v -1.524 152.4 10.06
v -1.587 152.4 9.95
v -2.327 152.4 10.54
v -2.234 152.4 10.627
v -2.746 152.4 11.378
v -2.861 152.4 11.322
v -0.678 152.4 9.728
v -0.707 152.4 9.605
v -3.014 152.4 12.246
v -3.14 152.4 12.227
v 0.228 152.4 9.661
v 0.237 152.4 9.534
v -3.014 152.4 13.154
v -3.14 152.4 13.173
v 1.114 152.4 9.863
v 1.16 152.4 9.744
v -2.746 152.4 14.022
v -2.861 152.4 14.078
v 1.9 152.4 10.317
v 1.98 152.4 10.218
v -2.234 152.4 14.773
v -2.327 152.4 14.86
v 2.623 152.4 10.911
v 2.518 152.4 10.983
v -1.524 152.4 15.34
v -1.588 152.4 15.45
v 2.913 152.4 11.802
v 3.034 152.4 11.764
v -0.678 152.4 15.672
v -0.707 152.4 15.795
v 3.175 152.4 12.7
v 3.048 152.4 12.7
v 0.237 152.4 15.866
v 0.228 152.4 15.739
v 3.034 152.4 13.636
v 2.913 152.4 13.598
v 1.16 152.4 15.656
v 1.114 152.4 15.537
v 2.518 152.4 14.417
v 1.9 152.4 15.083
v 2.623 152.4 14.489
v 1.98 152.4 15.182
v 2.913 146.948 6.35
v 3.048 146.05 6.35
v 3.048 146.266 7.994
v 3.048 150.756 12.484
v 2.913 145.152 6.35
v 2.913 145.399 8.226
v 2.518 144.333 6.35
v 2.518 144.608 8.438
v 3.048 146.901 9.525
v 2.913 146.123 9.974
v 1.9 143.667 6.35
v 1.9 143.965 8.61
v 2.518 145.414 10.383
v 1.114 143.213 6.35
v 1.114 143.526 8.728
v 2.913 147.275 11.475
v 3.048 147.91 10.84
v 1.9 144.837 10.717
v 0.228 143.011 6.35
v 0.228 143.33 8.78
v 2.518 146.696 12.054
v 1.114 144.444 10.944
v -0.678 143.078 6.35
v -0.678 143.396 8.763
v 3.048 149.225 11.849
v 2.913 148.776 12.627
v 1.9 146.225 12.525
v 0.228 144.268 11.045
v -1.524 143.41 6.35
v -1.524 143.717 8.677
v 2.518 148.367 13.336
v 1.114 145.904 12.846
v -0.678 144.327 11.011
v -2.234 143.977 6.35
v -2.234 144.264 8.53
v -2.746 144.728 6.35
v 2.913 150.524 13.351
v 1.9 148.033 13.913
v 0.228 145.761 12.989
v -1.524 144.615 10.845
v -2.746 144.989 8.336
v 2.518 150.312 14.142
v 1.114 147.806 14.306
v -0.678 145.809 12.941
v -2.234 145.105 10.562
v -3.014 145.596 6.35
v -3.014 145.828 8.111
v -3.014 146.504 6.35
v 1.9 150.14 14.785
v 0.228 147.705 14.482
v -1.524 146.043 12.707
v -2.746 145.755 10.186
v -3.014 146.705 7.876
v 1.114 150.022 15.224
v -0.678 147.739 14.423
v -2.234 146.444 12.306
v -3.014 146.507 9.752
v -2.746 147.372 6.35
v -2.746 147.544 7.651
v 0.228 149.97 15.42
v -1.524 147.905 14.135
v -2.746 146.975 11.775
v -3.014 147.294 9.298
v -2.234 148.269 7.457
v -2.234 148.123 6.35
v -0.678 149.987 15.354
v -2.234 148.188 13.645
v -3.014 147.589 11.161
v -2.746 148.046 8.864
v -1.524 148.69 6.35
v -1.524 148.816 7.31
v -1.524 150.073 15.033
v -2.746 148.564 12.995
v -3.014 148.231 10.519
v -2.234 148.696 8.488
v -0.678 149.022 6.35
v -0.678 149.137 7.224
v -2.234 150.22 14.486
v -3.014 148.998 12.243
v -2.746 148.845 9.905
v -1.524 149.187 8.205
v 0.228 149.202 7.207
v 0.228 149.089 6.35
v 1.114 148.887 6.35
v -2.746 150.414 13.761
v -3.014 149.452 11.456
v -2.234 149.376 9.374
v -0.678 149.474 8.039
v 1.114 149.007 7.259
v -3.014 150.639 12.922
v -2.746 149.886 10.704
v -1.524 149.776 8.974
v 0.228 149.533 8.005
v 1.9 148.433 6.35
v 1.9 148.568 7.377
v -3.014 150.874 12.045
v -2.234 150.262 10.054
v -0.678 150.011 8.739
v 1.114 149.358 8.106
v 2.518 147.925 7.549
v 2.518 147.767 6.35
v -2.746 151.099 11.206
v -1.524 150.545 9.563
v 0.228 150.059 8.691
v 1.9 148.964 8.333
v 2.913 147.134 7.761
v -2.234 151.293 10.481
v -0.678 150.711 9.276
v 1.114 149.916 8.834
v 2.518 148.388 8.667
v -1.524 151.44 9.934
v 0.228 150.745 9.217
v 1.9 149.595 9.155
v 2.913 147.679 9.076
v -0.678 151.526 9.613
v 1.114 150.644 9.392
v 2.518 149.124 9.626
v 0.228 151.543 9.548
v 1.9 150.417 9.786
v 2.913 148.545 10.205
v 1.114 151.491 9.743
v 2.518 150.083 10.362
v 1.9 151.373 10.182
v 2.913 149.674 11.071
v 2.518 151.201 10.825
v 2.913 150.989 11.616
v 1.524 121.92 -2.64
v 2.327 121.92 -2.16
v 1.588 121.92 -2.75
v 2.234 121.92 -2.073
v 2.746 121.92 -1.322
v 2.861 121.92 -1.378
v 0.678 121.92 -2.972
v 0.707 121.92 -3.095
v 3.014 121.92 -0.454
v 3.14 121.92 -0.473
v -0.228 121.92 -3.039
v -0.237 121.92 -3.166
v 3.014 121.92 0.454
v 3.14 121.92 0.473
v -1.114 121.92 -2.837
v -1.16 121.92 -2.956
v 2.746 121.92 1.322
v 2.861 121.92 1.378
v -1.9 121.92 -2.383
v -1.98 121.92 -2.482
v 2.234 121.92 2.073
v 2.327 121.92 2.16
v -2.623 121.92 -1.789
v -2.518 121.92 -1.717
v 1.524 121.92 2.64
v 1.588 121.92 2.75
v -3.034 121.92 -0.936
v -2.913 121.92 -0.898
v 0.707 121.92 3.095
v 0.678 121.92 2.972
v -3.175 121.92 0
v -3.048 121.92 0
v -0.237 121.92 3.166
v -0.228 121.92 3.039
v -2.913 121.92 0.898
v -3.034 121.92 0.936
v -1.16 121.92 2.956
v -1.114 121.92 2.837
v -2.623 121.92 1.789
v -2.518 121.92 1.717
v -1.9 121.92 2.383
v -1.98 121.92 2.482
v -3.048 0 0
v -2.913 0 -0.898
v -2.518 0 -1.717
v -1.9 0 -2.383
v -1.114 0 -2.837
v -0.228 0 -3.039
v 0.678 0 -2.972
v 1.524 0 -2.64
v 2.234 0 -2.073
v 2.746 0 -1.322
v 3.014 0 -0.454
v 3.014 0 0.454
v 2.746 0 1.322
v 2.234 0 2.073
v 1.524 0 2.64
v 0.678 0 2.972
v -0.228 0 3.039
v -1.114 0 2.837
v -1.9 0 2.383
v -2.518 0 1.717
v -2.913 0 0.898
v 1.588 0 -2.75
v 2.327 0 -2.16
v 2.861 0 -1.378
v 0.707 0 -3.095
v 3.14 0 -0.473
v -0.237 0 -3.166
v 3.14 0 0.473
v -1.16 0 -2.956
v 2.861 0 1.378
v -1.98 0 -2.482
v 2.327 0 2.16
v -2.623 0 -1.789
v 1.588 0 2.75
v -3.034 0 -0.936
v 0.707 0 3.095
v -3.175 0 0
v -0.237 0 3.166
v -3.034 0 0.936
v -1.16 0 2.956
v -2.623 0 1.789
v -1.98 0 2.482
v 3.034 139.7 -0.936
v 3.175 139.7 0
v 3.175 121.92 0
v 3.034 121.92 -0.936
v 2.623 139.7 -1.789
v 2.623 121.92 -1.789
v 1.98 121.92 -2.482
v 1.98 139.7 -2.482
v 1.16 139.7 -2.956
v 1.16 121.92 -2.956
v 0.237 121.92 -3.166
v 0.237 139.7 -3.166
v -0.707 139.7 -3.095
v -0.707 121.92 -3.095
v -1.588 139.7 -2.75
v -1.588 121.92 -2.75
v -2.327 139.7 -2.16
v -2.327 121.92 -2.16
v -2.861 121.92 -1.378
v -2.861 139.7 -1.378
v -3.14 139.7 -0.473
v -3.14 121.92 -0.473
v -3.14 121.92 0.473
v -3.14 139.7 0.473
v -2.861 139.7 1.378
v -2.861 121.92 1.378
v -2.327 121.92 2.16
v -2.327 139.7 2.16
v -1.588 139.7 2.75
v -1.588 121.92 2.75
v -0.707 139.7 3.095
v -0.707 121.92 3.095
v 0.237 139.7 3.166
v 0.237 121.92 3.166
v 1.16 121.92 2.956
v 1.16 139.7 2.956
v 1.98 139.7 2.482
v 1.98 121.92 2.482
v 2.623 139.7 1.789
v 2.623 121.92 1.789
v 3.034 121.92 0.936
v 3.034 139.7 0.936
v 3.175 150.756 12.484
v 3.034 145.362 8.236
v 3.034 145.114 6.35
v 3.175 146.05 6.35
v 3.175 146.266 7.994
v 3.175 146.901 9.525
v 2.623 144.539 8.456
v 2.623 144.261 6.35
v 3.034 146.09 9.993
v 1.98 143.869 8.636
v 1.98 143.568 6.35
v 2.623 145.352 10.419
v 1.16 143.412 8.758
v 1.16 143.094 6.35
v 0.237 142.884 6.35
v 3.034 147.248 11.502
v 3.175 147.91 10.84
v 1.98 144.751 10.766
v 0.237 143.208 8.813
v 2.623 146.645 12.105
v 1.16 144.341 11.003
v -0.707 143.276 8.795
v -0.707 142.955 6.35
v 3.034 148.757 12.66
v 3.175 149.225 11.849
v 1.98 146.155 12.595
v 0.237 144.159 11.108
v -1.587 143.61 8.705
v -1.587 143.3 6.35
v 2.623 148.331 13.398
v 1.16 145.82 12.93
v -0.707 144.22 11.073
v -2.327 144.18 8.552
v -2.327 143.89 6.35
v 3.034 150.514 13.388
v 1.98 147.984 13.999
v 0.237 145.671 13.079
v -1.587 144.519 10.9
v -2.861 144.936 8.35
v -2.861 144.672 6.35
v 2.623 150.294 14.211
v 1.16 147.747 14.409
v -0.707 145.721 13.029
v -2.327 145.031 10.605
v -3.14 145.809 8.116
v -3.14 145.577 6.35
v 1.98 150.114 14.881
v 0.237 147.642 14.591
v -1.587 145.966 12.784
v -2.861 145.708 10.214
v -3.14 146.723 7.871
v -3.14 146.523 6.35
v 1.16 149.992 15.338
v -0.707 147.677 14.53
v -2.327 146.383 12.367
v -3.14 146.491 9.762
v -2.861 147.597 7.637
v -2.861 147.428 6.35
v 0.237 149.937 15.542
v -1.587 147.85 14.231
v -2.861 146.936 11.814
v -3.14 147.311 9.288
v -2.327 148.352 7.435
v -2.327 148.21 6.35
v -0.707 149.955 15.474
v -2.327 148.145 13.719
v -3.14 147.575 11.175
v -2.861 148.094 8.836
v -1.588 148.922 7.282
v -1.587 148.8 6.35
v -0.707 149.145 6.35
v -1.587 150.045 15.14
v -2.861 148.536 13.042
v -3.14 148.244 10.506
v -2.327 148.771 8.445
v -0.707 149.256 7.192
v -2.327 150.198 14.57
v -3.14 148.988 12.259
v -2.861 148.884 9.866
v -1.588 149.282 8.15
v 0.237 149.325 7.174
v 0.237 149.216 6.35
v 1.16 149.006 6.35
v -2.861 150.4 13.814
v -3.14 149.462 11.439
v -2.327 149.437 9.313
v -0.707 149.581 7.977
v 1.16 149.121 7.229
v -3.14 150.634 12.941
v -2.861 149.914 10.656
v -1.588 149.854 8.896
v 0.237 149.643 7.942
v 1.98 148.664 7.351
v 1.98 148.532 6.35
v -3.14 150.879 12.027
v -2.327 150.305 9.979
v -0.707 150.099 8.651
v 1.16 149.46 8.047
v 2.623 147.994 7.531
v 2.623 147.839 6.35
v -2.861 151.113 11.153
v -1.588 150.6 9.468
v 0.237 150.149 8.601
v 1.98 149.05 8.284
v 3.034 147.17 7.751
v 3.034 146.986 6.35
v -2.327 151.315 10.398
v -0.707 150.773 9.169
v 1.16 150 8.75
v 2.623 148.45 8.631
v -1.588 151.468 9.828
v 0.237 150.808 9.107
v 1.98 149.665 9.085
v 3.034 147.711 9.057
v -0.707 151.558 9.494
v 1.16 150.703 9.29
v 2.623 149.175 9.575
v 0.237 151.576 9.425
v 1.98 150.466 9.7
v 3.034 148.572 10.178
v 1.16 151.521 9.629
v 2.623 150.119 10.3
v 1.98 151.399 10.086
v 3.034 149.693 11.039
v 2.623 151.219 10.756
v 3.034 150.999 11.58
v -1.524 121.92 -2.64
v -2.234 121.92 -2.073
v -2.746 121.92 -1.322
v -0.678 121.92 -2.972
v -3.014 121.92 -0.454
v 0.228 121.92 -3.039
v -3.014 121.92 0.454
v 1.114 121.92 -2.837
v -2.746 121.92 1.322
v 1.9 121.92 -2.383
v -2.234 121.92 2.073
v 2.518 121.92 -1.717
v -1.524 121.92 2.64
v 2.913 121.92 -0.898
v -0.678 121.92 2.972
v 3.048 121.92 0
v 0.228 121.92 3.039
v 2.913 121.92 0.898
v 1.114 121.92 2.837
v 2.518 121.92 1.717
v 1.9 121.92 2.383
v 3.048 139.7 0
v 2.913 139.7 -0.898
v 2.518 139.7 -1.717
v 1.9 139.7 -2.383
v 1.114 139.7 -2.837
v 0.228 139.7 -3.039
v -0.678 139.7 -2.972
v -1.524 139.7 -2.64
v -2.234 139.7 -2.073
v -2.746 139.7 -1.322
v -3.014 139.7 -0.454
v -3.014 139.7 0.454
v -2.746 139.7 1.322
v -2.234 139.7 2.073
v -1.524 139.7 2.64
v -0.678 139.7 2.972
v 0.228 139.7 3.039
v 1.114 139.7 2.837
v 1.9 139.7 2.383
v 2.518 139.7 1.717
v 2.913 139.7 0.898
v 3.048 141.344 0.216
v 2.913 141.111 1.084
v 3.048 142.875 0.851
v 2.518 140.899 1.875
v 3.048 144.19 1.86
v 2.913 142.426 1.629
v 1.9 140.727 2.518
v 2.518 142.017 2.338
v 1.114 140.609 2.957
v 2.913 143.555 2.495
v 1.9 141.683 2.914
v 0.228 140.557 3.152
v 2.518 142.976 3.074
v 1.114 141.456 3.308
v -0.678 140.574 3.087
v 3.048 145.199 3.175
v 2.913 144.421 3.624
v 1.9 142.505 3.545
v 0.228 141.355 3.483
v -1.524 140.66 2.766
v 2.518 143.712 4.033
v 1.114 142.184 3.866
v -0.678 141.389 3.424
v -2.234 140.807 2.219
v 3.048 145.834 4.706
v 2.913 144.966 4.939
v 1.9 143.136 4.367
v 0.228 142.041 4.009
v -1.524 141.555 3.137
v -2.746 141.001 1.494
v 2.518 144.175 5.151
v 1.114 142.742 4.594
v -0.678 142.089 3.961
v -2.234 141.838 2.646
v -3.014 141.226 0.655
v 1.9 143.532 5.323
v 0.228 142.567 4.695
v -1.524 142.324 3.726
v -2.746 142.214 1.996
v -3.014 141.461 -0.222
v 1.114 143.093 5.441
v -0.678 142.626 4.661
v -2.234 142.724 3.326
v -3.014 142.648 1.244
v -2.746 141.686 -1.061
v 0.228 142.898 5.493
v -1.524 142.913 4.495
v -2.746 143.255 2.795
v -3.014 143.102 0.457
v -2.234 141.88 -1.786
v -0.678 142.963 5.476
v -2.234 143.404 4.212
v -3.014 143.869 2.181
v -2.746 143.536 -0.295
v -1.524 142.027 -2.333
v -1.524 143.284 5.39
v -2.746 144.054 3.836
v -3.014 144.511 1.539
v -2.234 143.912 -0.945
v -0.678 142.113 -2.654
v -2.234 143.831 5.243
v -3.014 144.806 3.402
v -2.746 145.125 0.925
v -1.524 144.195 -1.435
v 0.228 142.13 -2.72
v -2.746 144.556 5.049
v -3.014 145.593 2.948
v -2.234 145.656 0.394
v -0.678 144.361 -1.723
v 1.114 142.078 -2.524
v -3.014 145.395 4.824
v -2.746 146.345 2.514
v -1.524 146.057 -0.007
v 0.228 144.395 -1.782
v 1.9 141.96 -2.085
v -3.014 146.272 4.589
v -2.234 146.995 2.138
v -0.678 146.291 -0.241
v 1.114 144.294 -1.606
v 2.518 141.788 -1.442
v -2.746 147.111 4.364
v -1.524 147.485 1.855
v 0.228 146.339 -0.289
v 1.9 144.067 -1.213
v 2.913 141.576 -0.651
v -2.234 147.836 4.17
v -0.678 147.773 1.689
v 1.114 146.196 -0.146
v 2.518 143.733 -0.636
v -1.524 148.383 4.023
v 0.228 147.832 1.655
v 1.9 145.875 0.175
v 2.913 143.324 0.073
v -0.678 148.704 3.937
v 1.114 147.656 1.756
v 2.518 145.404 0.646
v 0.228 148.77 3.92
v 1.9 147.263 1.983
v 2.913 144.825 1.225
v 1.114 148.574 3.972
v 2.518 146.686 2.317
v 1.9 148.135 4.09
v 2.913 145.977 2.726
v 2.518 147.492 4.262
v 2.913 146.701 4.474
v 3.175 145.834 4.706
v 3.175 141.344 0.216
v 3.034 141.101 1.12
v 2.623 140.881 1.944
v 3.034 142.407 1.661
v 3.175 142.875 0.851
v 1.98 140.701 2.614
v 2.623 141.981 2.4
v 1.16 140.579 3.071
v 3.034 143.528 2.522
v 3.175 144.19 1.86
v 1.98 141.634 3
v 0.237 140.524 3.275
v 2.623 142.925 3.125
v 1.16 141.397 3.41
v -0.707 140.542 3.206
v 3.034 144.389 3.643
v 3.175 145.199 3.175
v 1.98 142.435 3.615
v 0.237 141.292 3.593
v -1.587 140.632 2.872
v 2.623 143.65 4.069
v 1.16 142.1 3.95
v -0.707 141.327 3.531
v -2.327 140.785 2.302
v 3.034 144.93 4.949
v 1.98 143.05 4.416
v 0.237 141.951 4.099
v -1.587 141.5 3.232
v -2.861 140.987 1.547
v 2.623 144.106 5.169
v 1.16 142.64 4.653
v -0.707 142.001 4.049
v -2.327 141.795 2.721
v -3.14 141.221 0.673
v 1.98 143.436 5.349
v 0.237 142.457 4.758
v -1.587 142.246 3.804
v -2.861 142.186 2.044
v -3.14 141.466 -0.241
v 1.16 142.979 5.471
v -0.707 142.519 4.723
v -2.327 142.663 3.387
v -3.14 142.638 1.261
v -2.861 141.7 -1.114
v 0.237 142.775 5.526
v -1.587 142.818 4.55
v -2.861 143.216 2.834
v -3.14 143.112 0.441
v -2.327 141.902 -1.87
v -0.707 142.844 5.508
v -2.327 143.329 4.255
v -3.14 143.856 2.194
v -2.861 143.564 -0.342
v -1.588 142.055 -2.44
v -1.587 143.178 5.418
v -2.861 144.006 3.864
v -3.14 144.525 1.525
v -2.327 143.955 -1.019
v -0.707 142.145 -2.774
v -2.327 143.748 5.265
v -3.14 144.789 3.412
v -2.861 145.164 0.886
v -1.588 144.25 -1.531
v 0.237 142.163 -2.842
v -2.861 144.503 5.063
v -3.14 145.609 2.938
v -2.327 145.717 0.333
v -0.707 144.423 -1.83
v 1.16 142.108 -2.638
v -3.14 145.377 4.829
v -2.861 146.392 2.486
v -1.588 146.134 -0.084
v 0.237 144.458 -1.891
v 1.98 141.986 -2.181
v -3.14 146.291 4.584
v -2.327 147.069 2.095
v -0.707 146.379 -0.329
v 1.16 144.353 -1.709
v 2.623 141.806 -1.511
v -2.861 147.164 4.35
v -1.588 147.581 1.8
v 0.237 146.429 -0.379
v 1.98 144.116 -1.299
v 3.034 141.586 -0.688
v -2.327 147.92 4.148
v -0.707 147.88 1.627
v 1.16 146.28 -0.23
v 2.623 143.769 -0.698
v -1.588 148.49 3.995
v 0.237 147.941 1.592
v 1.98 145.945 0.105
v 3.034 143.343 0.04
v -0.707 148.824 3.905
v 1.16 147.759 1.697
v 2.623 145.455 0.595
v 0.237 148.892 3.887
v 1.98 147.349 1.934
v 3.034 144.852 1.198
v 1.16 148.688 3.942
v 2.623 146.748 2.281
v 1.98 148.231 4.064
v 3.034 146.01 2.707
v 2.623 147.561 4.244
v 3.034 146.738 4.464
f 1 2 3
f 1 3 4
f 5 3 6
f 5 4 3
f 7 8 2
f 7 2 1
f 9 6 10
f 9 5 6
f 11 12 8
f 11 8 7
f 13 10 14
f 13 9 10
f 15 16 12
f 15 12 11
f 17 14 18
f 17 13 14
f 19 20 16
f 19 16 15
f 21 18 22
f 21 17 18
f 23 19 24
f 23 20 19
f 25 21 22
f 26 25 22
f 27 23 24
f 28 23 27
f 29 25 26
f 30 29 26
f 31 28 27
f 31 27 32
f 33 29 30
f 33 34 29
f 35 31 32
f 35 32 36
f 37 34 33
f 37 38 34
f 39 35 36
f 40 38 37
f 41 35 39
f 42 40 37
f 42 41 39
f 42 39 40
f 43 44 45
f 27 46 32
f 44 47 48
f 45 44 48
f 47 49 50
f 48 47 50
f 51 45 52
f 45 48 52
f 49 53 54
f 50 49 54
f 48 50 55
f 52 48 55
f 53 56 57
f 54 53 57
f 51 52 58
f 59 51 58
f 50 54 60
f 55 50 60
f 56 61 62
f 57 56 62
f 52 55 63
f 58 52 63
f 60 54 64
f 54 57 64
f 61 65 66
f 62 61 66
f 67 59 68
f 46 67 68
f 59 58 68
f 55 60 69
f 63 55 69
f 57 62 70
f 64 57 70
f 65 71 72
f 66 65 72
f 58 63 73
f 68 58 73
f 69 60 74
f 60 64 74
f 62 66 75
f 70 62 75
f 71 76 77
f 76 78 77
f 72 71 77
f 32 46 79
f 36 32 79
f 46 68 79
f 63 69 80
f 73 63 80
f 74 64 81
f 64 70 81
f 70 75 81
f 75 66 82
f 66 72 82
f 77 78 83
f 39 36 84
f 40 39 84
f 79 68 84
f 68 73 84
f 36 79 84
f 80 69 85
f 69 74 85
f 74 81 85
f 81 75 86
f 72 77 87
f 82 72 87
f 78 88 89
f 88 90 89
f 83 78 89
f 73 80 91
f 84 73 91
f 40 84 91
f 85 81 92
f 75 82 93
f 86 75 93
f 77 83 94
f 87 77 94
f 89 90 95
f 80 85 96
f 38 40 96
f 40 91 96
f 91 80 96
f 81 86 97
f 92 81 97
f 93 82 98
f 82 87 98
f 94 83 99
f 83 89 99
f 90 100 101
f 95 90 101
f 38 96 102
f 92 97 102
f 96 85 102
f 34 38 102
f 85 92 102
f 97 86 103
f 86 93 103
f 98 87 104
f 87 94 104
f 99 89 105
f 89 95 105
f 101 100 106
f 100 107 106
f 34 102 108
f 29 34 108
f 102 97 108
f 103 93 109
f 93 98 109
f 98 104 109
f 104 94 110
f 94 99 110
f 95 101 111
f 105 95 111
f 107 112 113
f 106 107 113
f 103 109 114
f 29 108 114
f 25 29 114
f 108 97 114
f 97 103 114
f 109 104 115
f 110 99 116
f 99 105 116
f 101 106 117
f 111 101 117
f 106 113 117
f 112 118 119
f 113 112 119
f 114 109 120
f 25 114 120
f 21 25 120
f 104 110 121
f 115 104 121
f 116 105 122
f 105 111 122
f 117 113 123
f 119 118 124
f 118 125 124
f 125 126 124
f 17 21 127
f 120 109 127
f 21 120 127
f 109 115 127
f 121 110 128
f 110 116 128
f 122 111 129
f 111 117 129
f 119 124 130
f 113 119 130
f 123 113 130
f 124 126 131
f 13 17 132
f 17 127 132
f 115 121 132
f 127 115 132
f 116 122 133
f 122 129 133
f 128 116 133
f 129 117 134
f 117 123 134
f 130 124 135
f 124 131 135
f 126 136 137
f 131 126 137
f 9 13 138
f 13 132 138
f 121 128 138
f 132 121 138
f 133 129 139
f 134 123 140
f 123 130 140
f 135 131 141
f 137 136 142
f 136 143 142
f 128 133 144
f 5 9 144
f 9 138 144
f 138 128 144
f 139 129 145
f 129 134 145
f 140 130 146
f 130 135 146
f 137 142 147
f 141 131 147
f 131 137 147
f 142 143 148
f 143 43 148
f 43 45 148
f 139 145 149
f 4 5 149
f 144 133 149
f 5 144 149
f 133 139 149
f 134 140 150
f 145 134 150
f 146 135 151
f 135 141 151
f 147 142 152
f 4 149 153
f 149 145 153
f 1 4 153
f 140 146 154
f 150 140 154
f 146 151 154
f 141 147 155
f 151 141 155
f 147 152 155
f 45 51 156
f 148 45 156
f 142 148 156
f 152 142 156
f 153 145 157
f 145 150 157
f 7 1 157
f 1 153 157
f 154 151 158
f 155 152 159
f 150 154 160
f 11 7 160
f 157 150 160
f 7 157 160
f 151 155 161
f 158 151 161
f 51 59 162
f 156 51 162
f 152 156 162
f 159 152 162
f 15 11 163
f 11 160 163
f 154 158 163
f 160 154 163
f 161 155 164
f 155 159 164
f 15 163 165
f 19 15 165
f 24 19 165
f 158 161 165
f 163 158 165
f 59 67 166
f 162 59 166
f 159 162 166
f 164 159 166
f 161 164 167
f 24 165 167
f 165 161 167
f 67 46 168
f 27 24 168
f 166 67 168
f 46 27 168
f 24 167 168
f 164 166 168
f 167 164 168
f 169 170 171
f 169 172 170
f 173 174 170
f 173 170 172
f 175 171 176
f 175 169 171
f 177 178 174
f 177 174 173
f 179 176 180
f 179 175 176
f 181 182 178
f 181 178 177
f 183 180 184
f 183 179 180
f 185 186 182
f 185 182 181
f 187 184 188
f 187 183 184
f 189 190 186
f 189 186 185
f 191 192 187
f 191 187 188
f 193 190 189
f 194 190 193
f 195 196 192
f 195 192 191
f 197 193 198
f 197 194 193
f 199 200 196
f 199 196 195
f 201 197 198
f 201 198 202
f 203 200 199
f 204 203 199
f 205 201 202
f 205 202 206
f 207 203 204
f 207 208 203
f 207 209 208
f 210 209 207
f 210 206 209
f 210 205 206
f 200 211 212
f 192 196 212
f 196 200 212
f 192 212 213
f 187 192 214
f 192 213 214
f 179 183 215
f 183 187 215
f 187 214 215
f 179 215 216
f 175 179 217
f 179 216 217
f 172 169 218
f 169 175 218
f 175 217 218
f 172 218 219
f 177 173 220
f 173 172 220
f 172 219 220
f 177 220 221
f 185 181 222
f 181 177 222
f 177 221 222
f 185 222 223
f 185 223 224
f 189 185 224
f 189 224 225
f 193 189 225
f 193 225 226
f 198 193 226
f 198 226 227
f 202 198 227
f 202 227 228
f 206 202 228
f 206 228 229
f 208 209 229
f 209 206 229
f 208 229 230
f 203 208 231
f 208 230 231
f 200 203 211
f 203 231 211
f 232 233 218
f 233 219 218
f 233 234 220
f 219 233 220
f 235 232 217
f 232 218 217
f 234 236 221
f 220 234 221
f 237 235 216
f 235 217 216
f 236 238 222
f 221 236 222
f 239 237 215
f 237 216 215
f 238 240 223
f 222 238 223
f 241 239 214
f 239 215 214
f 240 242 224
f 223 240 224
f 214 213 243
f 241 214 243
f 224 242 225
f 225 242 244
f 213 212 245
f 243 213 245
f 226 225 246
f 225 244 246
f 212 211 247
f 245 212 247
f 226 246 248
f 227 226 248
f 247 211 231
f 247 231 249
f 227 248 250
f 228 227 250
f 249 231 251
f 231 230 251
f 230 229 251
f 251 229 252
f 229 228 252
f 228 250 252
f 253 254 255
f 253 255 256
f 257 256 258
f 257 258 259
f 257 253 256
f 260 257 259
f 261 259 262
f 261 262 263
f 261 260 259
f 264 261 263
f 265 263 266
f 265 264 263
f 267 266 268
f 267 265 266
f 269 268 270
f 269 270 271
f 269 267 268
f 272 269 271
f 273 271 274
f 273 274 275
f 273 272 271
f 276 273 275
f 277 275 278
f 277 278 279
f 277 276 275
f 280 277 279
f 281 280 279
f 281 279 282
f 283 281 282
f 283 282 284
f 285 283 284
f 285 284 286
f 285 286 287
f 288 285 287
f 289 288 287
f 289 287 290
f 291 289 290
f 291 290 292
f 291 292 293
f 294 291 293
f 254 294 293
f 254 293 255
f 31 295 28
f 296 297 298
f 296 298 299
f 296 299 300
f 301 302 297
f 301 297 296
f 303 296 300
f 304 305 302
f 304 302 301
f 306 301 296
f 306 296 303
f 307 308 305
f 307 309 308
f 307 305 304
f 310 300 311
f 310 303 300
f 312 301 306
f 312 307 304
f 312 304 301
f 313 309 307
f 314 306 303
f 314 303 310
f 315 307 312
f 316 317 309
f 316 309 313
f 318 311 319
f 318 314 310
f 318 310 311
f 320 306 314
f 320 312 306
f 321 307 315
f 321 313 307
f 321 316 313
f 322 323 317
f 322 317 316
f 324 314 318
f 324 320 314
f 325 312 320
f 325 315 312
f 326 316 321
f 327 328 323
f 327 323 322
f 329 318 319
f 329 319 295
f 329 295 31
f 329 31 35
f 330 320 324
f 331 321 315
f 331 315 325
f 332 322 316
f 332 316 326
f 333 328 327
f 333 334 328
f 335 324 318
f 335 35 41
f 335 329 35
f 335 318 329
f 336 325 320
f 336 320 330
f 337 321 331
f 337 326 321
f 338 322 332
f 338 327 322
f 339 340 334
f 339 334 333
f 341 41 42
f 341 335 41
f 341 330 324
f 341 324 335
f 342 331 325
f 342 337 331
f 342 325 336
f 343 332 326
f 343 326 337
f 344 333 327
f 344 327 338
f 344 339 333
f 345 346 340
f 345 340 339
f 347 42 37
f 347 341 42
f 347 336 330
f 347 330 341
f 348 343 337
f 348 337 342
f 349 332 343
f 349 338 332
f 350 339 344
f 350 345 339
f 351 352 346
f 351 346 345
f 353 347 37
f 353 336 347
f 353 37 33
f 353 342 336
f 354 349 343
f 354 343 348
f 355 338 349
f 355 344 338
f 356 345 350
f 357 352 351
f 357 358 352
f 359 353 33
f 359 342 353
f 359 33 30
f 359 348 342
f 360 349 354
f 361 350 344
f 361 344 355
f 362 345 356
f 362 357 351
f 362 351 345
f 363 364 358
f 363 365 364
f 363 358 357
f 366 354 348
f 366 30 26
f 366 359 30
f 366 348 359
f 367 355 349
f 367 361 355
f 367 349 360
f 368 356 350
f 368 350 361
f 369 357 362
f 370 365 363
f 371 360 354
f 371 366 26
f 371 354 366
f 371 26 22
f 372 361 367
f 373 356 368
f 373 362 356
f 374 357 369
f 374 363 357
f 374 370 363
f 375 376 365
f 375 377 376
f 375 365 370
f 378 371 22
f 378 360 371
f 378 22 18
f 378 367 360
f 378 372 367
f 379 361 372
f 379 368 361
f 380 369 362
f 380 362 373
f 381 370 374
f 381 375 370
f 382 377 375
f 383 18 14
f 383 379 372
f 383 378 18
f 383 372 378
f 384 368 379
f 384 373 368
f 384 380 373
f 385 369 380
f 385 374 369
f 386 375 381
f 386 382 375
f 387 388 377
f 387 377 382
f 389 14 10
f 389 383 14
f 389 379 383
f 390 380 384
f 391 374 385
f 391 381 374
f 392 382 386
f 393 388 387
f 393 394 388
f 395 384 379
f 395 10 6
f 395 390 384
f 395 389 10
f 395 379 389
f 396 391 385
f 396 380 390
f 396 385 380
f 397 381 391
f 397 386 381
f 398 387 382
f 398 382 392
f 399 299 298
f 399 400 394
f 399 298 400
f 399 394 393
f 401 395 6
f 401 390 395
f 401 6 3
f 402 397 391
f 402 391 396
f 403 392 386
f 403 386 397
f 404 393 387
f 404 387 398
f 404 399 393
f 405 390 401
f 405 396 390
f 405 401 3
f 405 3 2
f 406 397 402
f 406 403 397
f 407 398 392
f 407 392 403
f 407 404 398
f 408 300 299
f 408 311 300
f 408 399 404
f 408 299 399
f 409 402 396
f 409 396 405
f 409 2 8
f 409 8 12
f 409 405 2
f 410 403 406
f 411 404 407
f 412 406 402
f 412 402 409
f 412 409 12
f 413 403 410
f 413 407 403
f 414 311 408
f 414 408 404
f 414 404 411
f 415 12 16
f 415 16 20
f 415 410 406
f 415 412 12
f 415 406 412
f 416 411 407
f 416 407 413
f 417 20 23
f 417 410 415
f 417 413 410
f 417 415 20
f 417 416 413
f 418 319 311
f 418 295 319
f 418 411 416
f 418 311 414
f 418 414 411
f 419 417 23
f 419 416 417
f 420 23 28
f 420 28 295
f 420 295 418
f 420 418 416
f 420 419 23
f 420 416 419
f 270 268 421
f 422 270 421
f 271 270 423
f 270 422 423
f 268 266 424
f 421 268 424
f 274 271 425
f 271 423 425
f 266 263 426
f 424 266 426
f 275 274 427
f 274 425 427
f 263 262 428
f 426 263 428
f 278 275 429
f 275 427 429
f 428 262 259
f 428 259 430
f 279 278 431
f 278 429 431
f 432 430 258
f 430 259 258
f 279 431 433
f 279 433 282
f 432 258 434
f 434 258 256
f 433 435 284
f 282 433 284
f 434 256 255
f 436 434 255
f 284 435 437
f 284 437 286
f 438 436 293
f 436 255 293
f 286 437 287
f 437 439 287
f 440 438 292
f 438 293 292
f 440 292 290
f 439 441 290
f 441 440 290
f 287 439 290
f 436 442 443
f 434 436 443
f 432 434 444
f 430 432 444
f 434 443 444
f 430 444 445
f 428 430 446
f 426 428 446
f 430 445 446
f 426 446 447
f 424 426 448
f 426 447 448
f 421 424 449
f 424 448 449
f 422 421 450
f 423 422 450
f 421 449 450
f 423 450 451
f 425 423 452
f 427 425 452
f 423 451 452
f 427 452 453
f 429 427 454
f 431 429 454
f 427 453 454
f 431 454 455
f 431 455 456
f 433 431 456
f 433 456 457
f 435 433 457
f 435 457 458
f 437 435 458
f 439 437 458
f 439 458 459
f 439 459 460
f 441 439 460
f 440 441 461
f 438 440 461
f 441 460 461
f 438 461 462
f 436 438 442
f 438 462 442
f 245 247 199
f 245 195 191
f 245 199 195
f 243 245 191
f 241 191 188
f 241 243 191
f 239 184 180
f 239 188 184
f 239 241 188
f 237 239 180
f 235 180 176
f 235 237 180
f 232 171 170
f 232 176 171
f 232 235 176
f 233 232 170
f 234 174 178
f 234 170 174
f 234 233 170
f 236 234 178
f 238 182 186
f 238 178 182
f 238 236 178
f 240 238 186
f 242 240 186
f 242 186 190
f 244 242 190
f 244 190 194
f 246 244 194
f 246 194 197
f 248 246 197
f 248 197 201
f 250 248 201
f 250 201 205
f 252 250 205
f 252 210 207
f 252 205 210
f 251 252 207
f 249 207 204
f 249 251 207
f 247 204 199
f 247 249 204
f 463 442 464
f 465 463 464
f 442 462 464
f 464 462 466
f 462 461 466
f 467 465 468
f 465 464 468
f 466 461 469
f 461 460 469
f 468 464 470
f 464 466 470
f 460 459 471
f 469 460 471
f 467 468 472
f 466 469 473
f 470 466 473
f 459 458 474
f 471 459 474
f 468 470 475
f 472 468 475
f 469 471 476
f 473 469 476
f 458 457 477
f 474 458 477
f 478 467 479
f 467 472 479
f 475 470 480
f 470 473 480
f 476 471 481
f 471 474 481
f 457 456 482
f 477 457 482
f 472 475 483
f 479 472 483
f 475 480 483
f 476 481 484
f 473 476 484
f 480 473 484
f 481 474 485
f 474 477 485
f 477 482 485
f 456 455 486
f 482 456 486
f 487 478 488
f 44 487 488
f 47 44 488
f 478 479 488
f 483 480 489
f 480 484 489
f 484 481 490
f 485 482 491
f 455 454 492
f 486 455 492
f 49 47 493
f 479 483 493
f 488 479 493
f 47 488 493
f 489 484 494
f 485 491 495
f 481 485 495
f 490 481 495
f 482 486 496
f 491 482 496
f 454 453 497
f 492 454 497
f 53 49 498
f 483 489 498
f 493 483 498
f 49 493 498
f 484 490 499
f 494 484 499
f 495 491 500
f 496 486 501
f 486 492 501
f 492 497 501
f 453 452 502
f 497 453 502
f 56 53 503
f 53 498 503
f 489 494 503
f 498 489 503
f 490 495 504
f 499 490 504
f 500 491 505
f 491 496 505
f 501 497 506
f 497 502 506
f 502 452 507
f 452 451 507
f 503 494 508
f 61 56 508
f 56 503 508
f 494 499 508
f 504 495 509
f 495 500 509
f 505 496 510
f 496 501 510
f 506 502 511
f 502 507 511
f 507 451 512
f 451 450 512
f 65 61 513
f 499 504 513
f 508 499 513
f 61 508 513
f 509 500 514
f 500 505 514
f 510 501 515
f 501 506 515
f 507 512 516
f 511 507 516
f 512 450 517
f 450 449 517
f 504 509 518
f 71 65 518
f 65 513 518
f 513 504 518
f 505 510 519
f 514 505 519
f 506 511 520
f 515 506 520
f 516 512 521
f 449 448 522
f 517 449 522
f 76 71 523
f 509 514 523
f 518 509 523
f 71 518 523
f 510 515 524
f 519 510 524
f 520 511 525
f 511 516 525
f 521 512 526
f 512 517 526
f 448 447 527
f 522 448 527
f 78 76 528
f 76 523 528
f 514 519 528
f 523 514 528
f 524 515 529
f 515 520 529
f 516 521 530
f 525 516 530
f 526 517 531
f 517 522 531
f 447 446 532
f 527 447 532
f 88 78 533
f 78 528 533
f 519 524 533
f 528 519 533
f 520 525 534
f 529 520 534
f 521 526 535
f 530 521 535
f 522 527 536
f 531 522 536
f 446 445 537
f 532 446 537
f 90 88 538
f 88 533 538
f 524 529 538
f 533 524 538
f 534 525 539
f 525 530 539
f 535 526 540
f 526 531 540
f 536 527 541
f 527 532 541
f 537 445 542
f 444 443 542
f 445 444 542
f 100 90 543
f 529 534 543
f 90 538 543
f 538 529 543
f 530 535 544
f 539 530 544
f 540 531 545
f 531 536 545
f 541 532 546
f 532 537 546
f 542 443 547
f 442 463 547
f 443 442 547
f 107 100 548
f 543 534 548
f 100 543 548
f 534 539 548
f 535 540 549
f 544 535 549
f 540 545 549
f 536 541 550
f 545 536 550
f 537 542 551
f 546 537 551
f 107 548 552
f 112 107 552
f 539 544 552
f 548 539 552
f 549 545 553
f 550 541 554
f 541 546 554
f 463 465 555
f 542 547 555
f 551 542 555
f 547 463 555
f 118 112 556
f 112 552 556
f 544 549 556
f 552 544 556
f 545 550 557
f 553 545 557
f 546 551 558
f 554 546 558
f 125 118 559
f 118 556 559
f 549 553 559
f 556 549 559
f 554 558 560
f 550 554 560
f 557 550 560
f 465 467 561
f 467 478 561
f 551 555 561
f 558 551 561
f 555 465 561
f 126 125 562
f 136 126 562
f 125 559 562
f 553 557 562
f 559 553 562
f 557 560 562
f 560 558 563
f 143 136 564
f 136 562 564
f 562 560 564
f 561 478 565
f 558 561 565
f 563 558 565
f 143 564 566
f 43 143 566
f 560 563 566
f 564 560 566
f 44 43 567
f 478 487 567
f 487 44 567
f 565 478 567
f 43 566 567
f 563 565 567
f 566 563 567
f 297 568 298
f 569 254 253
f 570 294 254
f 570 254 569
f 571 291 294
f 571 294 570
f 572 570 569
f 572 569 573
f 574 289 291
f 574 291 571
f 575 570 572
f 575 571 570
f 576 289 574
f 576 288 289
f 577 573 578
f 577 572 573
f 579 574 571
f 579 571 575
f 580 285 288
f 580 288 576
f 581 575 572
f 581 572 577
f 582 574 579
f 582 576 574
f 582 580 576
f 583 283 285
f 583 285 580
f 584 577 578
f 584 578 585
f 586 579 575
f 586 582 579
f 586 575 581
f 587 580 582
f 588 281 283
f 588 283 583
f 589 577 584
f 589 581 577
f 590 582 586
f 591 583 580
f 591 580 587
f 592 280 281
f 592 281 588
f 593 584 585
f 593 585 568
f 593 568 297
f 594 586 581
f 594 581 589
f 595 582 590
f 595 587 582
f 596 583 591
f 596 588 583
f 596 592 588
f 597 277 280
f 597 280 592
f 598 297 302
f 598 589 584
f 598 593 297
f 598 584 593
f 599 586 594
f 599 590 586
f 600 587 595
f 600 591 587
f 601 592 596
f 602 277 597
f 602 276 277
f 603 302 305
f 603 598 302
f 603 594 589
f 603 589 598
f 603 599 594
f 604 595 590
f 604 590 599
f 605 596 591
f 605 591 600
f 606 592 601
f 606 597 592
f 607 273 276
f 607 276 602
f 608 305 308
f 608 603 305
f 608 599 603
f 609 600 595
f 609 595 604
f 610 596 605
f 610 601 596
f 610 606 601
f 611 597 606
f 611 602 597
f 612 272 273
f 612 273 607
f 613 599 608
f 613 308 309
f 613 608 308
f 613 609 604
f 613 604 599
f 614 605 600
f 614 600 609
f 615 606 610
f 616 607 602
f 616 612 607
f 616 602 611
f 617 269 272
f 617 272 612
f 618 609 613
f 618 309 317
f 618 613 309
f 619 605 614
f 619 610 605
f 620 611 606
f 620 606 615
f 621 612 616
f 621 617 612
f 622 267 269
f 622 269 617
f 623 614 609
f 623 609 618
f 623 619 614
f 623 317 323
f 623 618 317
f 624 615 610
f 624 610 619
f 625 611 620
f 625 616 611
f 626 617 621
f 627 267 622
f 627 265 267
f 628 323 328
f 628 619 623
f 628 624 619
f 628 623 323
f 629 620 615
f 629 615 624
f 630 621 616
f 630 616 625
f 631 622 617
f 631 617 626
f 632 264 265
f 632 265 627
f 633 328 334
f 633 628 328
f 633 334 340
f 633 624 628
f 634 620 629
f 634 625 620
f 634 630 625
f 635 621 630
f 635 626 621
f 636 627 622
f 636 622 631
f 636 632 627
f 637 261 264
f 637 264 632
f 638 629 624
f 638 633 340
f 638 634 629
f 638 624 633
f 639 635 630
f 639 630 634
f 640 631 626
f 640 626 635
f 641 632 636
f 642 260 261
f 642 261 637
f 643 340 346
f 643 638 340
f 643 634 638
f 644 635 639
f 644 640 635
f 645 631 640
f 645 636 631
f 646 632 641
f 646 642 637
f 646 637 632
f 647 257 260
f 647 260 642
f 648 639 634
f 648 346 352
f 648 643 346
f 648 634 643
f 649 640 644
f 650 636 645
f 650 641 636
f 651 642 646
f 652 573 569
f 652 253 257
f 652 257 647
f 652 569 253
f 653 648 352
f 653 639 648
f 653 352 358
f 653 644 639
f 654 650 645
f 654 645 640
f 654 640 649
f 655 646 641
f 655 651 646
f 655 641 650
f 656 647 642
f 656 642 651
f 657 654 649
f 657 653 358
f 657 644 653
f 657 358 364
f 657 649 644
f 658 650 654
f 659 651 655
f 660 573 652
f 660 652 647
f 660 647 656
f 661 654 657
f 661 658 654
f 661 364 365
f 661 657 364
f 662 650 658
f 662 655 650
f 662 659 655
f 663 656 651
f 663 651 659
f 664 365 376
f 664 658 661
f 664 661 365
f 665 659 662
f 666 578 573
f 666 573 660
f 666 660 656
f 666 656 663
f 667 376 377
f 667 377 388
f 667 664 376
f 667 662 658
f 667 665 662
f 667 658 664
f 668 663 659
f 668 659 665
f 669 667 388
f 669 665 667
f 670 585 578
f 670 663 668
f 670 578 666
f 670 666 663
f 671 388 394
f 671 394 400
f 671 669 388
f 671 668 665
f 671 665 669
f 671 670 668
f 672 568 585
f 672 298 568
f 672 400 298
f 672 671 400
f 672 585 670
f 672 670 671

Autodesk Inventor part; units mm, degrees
ref_plane "YZ Plane" through (0, 0, 0) normal (1, 0, 0) x (0, 1, 0)
ref_plane "XZ Plane" through (0, 0, 0) normal (0, 1, 0) x (-1, 0, 0)
ref_plane "XY Plane" through (0, 0, 0) normal (0, 0, 1) x (1, 0, 0)
sketch "Sketch1" plane through (0, 0, 0) normal (0, 1, 0) x (-1, 0, 0)
  circle A0 centre (0, 0) radius 3.175
  circle A1 centre (0, 0) radius 3.048
  dimension "d0" = 6.35
  dimension "d1" = 6.096
extrude "Extrusion1" add sketch "Sketch1" along normal blind 121.92
sketch "Sketch8" plane through (0, 0, 0) normal (1, 0, 0) x (0, 1, 0)
  line L0 (121.92, -3.175) -> (121.92, 3.175) projected
  line L1 (121.92, 0) -> (139.7, 0)
  arc A0 (139.7, 0) -> (146.05, 6.35) centre (139.7, 6.35) ccw
  arc A1 (152.4, 12.7) -> (146.05, 6.35) centre (152.4, 6.35) ccw
  point P0 (0, 0)
  dimension "d31" = 17.78
sketch "Sketch9" plane through (0, 121.92, 0) normal (0, 1, 0) x (1, 0, 0)
  circle A0 centre (0, 0) radius 3.175 projected
  circle A1 centre (0, 0) radius 3.048 projected
sweep "Sweep4" add profiles "Sketch9" path "Sketch8" separate body path curves L1 A0 A1
properties part number "waterpipe3"
